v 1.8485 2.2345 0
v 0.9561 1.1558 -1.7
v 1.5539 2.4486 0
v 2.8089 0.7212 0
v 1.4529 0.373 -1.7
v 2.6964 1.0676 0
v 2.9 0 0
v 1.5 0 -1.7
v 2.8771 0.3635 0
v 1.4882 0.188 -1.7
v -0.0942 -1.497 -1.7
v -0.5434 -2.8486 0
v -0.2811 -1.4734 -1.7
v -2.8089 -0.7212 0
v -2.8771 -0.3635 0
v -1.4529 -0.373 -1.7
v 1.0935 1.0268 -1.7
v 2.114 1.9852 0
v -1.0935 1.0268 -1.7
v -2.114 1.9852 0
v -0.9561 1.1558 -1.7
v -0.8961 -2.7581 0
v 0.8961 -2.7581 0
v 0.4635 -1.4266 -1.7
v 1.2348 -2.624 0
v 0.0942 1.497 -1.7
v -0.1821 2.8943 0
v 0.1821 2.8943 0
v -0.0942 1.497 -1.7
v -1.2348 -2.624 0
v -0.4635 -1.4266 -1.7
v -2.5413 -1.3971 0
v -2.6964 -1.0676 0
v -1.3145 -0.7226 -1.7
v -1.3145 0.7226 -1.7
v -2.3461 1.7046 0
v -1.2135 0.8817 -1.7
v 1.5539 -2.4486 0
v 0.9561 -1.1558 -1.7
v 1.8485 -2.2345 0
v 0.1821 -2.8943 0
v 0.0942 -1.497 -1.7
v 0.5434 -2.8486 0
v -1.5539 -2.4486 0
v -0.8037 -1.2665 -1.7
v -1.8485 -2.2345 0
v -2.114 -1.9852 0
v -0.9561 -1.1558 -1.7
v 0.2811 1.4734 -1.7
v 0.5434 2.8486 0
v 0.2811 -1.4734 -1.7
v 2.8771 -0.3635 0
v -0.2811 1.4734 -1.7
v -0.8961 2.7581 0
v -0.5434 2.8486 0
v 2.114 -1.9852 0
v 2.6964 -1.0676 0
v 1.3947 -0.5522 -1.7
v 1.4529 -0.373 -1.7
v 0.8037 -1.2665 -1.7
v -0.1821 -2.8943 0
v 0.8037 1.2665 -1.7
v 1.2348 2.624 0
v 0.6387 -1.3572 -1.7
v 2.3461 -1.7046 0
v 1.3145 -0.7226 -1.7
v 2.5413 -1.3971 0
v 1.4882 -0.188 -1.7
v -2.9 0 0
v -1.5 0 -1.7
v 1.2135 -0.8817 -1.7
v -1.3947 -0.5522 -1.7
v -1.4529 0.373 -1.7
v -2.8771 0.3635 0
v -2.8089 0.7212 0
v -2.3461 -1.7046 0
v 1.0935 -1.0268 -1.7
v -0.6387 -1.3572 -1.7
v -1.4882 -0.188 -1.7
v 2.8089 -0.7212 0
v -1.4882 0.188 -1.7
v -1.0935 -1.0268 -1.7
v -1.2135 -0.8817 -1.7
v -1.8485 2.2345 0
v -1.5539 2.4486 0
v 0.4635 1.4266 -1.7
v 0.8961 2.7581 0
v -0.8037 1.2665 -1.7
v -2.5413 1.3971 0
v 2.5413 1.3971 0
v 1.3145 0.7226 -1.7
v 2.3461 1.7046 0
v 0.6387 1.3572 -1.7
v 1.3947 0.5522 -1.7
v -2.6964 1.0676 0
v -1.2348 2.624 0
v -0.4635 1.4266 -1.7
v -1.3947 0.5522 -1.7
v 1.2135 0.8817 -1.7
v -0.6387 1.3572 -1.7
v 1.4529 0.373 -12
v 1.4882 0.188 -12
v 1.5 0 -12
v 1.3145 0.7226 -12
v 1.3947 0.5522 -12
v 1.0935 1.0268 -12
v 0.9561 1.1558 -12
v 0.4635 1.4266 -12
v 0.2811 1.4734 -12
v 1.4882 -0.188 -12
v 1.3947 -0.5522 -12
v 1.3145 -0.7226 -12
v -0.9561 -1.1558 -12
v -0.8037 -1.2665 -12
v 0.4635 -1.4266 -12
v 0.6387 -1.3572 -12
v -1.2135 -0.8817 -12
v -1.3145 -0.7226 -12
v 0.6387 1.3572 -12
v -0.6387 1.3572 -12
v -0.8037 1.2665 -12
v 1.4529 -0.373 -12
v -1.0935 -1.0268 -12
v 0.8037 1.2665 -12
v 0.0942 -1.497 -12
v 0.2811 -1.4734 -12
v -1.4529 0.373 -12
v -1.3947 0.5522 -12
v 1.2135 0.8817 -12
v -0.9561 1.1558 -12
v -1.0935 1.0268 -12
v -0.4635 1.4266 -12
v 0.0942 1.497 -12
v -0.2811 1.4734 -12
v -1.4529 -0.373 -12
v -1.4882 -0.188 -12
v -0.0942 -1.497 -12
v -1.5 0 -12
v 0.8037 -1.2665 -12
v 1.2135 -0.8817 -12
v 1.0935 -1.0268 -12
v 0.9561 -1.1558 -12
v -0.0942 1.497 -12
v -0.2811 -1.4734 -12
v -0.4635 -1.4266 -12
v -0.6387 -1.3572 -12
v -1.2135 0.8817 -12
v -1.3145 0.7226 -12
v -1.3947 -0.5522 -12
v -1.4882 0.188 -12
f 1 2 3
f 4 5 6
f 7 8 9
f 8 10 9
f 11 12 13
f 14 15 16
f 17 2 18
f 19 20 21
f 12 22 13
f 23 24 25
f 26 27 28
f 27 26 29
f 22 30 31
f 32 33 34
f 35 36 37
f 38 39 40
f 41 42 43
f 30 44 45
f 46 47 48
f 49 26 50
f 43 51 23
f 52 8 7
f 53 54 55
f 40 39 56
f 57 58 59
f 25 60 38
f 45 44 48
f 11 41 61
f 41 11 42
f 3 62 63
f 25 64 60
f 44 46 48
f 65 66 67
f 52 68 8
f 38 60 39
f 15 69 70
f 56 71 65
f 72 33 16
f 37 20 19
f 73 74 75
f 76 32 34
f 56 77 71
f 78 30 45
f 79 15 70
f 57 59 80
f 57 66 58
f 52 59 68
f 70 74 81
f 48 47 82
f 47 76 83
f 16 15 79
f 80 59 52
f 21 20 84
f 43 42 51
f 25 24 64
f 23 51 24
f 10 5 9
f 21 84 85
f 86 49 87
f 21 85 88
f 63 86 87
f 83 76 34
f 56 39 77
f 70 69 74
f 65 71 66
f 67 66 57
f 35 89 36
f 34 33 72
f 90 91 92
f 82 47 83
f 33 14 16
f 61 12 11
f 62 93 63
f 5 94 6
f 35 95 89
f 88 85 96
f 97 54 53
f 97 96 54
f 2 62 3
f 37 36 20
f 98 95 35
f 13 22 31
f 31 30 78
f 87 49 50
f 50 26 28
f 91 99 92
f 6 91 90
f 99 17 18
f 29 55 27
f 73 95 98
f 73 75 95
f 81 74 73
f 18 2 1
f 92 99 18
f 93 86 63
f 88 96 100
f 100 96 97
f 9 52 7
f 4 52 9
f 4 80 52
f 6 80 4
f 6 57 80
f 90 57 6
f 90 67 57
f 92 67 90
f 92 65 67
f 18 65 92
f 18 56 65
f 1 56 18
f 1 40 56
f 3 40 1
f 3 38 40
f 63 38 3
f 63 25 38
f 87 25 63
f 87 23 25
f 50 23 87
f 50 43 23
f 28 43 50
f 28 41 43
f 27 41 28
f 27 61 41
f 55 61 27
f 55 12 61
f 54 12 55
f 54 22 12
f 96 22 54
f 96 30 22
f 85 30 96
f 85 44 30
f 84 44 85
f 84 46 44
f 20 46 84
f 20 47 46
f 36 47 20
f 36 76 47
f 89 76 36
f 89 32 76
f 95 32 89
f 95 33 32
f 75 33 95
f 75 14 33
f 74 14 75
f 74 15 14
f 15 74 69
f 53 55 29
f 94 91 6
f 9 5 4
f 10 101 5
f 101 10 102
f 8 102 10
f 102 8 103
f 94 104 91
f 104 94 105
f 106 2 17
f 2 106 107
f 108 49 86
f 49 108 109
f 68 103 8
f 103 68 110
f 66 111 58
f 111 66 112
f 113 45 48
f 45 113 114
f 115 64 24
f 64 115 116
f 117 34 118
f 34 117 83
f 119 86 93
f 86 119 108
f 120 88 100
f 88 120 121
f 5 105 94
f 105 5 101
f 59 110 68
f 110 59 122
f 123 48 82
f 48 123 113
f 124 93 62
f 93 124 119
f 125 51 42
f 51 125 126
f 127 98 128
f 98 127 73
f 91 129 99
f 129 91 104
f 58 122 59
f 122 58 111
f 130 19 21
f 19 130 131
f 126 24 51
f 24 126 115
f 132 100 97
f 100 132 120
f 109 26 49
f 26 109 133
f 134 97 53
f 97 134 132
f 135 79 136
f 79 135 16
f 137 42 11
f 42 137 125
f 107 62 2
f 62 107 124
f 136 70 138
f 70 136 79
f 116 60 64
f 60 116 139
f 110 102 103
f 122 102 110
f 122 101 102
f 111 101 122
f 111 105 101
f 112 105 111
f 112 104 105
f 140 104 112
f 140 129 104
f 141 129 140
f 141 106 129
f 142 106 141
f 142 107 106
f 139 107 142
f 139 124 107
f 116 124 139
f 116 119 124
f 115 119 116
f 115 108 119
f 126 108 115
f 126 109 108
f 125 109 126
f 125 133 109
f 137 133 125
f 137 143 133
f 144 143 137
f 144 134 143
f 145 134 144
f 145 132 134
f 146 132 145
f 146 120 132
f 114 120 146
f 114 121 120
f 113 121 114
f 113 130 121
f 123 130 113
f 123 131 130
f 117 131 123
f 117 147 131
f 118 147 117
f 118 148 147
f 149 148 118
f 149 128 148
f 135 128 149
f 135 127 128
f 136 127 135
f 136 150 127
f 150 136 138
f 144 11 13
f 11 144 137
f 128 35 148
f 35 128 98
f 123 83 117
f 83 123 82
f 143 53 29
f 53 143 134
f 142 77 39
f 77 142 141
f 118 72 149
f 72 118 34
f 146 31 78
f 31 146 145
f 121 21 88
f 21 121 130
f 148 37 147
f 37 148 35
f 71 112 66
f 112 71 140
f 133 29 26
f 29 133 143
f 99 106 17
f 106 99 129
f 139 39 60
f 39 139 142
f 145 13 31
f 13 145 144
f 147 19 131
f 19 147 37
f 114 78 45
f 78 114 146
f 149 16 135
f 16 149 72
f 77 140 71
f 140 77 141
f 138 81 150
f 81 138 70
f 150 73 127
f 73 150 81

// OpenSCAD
$fn = 50;


difference() {
	union() {
		translate(v = [0, 0, -1.7000000000]) {
			rotate(a = [0, 0, 0]) {
				cylinder(h = 1.7000000000, r1 = 1.5000000000, r2 = 2.9000000000);
			}
		}
		translate(v = [0, 0, -12]) {
			rotate(a = [0, 0, 0]) {
				cylinder(h = 12, r = 1.5000000000);
			}
		}
	}
	union();
}
